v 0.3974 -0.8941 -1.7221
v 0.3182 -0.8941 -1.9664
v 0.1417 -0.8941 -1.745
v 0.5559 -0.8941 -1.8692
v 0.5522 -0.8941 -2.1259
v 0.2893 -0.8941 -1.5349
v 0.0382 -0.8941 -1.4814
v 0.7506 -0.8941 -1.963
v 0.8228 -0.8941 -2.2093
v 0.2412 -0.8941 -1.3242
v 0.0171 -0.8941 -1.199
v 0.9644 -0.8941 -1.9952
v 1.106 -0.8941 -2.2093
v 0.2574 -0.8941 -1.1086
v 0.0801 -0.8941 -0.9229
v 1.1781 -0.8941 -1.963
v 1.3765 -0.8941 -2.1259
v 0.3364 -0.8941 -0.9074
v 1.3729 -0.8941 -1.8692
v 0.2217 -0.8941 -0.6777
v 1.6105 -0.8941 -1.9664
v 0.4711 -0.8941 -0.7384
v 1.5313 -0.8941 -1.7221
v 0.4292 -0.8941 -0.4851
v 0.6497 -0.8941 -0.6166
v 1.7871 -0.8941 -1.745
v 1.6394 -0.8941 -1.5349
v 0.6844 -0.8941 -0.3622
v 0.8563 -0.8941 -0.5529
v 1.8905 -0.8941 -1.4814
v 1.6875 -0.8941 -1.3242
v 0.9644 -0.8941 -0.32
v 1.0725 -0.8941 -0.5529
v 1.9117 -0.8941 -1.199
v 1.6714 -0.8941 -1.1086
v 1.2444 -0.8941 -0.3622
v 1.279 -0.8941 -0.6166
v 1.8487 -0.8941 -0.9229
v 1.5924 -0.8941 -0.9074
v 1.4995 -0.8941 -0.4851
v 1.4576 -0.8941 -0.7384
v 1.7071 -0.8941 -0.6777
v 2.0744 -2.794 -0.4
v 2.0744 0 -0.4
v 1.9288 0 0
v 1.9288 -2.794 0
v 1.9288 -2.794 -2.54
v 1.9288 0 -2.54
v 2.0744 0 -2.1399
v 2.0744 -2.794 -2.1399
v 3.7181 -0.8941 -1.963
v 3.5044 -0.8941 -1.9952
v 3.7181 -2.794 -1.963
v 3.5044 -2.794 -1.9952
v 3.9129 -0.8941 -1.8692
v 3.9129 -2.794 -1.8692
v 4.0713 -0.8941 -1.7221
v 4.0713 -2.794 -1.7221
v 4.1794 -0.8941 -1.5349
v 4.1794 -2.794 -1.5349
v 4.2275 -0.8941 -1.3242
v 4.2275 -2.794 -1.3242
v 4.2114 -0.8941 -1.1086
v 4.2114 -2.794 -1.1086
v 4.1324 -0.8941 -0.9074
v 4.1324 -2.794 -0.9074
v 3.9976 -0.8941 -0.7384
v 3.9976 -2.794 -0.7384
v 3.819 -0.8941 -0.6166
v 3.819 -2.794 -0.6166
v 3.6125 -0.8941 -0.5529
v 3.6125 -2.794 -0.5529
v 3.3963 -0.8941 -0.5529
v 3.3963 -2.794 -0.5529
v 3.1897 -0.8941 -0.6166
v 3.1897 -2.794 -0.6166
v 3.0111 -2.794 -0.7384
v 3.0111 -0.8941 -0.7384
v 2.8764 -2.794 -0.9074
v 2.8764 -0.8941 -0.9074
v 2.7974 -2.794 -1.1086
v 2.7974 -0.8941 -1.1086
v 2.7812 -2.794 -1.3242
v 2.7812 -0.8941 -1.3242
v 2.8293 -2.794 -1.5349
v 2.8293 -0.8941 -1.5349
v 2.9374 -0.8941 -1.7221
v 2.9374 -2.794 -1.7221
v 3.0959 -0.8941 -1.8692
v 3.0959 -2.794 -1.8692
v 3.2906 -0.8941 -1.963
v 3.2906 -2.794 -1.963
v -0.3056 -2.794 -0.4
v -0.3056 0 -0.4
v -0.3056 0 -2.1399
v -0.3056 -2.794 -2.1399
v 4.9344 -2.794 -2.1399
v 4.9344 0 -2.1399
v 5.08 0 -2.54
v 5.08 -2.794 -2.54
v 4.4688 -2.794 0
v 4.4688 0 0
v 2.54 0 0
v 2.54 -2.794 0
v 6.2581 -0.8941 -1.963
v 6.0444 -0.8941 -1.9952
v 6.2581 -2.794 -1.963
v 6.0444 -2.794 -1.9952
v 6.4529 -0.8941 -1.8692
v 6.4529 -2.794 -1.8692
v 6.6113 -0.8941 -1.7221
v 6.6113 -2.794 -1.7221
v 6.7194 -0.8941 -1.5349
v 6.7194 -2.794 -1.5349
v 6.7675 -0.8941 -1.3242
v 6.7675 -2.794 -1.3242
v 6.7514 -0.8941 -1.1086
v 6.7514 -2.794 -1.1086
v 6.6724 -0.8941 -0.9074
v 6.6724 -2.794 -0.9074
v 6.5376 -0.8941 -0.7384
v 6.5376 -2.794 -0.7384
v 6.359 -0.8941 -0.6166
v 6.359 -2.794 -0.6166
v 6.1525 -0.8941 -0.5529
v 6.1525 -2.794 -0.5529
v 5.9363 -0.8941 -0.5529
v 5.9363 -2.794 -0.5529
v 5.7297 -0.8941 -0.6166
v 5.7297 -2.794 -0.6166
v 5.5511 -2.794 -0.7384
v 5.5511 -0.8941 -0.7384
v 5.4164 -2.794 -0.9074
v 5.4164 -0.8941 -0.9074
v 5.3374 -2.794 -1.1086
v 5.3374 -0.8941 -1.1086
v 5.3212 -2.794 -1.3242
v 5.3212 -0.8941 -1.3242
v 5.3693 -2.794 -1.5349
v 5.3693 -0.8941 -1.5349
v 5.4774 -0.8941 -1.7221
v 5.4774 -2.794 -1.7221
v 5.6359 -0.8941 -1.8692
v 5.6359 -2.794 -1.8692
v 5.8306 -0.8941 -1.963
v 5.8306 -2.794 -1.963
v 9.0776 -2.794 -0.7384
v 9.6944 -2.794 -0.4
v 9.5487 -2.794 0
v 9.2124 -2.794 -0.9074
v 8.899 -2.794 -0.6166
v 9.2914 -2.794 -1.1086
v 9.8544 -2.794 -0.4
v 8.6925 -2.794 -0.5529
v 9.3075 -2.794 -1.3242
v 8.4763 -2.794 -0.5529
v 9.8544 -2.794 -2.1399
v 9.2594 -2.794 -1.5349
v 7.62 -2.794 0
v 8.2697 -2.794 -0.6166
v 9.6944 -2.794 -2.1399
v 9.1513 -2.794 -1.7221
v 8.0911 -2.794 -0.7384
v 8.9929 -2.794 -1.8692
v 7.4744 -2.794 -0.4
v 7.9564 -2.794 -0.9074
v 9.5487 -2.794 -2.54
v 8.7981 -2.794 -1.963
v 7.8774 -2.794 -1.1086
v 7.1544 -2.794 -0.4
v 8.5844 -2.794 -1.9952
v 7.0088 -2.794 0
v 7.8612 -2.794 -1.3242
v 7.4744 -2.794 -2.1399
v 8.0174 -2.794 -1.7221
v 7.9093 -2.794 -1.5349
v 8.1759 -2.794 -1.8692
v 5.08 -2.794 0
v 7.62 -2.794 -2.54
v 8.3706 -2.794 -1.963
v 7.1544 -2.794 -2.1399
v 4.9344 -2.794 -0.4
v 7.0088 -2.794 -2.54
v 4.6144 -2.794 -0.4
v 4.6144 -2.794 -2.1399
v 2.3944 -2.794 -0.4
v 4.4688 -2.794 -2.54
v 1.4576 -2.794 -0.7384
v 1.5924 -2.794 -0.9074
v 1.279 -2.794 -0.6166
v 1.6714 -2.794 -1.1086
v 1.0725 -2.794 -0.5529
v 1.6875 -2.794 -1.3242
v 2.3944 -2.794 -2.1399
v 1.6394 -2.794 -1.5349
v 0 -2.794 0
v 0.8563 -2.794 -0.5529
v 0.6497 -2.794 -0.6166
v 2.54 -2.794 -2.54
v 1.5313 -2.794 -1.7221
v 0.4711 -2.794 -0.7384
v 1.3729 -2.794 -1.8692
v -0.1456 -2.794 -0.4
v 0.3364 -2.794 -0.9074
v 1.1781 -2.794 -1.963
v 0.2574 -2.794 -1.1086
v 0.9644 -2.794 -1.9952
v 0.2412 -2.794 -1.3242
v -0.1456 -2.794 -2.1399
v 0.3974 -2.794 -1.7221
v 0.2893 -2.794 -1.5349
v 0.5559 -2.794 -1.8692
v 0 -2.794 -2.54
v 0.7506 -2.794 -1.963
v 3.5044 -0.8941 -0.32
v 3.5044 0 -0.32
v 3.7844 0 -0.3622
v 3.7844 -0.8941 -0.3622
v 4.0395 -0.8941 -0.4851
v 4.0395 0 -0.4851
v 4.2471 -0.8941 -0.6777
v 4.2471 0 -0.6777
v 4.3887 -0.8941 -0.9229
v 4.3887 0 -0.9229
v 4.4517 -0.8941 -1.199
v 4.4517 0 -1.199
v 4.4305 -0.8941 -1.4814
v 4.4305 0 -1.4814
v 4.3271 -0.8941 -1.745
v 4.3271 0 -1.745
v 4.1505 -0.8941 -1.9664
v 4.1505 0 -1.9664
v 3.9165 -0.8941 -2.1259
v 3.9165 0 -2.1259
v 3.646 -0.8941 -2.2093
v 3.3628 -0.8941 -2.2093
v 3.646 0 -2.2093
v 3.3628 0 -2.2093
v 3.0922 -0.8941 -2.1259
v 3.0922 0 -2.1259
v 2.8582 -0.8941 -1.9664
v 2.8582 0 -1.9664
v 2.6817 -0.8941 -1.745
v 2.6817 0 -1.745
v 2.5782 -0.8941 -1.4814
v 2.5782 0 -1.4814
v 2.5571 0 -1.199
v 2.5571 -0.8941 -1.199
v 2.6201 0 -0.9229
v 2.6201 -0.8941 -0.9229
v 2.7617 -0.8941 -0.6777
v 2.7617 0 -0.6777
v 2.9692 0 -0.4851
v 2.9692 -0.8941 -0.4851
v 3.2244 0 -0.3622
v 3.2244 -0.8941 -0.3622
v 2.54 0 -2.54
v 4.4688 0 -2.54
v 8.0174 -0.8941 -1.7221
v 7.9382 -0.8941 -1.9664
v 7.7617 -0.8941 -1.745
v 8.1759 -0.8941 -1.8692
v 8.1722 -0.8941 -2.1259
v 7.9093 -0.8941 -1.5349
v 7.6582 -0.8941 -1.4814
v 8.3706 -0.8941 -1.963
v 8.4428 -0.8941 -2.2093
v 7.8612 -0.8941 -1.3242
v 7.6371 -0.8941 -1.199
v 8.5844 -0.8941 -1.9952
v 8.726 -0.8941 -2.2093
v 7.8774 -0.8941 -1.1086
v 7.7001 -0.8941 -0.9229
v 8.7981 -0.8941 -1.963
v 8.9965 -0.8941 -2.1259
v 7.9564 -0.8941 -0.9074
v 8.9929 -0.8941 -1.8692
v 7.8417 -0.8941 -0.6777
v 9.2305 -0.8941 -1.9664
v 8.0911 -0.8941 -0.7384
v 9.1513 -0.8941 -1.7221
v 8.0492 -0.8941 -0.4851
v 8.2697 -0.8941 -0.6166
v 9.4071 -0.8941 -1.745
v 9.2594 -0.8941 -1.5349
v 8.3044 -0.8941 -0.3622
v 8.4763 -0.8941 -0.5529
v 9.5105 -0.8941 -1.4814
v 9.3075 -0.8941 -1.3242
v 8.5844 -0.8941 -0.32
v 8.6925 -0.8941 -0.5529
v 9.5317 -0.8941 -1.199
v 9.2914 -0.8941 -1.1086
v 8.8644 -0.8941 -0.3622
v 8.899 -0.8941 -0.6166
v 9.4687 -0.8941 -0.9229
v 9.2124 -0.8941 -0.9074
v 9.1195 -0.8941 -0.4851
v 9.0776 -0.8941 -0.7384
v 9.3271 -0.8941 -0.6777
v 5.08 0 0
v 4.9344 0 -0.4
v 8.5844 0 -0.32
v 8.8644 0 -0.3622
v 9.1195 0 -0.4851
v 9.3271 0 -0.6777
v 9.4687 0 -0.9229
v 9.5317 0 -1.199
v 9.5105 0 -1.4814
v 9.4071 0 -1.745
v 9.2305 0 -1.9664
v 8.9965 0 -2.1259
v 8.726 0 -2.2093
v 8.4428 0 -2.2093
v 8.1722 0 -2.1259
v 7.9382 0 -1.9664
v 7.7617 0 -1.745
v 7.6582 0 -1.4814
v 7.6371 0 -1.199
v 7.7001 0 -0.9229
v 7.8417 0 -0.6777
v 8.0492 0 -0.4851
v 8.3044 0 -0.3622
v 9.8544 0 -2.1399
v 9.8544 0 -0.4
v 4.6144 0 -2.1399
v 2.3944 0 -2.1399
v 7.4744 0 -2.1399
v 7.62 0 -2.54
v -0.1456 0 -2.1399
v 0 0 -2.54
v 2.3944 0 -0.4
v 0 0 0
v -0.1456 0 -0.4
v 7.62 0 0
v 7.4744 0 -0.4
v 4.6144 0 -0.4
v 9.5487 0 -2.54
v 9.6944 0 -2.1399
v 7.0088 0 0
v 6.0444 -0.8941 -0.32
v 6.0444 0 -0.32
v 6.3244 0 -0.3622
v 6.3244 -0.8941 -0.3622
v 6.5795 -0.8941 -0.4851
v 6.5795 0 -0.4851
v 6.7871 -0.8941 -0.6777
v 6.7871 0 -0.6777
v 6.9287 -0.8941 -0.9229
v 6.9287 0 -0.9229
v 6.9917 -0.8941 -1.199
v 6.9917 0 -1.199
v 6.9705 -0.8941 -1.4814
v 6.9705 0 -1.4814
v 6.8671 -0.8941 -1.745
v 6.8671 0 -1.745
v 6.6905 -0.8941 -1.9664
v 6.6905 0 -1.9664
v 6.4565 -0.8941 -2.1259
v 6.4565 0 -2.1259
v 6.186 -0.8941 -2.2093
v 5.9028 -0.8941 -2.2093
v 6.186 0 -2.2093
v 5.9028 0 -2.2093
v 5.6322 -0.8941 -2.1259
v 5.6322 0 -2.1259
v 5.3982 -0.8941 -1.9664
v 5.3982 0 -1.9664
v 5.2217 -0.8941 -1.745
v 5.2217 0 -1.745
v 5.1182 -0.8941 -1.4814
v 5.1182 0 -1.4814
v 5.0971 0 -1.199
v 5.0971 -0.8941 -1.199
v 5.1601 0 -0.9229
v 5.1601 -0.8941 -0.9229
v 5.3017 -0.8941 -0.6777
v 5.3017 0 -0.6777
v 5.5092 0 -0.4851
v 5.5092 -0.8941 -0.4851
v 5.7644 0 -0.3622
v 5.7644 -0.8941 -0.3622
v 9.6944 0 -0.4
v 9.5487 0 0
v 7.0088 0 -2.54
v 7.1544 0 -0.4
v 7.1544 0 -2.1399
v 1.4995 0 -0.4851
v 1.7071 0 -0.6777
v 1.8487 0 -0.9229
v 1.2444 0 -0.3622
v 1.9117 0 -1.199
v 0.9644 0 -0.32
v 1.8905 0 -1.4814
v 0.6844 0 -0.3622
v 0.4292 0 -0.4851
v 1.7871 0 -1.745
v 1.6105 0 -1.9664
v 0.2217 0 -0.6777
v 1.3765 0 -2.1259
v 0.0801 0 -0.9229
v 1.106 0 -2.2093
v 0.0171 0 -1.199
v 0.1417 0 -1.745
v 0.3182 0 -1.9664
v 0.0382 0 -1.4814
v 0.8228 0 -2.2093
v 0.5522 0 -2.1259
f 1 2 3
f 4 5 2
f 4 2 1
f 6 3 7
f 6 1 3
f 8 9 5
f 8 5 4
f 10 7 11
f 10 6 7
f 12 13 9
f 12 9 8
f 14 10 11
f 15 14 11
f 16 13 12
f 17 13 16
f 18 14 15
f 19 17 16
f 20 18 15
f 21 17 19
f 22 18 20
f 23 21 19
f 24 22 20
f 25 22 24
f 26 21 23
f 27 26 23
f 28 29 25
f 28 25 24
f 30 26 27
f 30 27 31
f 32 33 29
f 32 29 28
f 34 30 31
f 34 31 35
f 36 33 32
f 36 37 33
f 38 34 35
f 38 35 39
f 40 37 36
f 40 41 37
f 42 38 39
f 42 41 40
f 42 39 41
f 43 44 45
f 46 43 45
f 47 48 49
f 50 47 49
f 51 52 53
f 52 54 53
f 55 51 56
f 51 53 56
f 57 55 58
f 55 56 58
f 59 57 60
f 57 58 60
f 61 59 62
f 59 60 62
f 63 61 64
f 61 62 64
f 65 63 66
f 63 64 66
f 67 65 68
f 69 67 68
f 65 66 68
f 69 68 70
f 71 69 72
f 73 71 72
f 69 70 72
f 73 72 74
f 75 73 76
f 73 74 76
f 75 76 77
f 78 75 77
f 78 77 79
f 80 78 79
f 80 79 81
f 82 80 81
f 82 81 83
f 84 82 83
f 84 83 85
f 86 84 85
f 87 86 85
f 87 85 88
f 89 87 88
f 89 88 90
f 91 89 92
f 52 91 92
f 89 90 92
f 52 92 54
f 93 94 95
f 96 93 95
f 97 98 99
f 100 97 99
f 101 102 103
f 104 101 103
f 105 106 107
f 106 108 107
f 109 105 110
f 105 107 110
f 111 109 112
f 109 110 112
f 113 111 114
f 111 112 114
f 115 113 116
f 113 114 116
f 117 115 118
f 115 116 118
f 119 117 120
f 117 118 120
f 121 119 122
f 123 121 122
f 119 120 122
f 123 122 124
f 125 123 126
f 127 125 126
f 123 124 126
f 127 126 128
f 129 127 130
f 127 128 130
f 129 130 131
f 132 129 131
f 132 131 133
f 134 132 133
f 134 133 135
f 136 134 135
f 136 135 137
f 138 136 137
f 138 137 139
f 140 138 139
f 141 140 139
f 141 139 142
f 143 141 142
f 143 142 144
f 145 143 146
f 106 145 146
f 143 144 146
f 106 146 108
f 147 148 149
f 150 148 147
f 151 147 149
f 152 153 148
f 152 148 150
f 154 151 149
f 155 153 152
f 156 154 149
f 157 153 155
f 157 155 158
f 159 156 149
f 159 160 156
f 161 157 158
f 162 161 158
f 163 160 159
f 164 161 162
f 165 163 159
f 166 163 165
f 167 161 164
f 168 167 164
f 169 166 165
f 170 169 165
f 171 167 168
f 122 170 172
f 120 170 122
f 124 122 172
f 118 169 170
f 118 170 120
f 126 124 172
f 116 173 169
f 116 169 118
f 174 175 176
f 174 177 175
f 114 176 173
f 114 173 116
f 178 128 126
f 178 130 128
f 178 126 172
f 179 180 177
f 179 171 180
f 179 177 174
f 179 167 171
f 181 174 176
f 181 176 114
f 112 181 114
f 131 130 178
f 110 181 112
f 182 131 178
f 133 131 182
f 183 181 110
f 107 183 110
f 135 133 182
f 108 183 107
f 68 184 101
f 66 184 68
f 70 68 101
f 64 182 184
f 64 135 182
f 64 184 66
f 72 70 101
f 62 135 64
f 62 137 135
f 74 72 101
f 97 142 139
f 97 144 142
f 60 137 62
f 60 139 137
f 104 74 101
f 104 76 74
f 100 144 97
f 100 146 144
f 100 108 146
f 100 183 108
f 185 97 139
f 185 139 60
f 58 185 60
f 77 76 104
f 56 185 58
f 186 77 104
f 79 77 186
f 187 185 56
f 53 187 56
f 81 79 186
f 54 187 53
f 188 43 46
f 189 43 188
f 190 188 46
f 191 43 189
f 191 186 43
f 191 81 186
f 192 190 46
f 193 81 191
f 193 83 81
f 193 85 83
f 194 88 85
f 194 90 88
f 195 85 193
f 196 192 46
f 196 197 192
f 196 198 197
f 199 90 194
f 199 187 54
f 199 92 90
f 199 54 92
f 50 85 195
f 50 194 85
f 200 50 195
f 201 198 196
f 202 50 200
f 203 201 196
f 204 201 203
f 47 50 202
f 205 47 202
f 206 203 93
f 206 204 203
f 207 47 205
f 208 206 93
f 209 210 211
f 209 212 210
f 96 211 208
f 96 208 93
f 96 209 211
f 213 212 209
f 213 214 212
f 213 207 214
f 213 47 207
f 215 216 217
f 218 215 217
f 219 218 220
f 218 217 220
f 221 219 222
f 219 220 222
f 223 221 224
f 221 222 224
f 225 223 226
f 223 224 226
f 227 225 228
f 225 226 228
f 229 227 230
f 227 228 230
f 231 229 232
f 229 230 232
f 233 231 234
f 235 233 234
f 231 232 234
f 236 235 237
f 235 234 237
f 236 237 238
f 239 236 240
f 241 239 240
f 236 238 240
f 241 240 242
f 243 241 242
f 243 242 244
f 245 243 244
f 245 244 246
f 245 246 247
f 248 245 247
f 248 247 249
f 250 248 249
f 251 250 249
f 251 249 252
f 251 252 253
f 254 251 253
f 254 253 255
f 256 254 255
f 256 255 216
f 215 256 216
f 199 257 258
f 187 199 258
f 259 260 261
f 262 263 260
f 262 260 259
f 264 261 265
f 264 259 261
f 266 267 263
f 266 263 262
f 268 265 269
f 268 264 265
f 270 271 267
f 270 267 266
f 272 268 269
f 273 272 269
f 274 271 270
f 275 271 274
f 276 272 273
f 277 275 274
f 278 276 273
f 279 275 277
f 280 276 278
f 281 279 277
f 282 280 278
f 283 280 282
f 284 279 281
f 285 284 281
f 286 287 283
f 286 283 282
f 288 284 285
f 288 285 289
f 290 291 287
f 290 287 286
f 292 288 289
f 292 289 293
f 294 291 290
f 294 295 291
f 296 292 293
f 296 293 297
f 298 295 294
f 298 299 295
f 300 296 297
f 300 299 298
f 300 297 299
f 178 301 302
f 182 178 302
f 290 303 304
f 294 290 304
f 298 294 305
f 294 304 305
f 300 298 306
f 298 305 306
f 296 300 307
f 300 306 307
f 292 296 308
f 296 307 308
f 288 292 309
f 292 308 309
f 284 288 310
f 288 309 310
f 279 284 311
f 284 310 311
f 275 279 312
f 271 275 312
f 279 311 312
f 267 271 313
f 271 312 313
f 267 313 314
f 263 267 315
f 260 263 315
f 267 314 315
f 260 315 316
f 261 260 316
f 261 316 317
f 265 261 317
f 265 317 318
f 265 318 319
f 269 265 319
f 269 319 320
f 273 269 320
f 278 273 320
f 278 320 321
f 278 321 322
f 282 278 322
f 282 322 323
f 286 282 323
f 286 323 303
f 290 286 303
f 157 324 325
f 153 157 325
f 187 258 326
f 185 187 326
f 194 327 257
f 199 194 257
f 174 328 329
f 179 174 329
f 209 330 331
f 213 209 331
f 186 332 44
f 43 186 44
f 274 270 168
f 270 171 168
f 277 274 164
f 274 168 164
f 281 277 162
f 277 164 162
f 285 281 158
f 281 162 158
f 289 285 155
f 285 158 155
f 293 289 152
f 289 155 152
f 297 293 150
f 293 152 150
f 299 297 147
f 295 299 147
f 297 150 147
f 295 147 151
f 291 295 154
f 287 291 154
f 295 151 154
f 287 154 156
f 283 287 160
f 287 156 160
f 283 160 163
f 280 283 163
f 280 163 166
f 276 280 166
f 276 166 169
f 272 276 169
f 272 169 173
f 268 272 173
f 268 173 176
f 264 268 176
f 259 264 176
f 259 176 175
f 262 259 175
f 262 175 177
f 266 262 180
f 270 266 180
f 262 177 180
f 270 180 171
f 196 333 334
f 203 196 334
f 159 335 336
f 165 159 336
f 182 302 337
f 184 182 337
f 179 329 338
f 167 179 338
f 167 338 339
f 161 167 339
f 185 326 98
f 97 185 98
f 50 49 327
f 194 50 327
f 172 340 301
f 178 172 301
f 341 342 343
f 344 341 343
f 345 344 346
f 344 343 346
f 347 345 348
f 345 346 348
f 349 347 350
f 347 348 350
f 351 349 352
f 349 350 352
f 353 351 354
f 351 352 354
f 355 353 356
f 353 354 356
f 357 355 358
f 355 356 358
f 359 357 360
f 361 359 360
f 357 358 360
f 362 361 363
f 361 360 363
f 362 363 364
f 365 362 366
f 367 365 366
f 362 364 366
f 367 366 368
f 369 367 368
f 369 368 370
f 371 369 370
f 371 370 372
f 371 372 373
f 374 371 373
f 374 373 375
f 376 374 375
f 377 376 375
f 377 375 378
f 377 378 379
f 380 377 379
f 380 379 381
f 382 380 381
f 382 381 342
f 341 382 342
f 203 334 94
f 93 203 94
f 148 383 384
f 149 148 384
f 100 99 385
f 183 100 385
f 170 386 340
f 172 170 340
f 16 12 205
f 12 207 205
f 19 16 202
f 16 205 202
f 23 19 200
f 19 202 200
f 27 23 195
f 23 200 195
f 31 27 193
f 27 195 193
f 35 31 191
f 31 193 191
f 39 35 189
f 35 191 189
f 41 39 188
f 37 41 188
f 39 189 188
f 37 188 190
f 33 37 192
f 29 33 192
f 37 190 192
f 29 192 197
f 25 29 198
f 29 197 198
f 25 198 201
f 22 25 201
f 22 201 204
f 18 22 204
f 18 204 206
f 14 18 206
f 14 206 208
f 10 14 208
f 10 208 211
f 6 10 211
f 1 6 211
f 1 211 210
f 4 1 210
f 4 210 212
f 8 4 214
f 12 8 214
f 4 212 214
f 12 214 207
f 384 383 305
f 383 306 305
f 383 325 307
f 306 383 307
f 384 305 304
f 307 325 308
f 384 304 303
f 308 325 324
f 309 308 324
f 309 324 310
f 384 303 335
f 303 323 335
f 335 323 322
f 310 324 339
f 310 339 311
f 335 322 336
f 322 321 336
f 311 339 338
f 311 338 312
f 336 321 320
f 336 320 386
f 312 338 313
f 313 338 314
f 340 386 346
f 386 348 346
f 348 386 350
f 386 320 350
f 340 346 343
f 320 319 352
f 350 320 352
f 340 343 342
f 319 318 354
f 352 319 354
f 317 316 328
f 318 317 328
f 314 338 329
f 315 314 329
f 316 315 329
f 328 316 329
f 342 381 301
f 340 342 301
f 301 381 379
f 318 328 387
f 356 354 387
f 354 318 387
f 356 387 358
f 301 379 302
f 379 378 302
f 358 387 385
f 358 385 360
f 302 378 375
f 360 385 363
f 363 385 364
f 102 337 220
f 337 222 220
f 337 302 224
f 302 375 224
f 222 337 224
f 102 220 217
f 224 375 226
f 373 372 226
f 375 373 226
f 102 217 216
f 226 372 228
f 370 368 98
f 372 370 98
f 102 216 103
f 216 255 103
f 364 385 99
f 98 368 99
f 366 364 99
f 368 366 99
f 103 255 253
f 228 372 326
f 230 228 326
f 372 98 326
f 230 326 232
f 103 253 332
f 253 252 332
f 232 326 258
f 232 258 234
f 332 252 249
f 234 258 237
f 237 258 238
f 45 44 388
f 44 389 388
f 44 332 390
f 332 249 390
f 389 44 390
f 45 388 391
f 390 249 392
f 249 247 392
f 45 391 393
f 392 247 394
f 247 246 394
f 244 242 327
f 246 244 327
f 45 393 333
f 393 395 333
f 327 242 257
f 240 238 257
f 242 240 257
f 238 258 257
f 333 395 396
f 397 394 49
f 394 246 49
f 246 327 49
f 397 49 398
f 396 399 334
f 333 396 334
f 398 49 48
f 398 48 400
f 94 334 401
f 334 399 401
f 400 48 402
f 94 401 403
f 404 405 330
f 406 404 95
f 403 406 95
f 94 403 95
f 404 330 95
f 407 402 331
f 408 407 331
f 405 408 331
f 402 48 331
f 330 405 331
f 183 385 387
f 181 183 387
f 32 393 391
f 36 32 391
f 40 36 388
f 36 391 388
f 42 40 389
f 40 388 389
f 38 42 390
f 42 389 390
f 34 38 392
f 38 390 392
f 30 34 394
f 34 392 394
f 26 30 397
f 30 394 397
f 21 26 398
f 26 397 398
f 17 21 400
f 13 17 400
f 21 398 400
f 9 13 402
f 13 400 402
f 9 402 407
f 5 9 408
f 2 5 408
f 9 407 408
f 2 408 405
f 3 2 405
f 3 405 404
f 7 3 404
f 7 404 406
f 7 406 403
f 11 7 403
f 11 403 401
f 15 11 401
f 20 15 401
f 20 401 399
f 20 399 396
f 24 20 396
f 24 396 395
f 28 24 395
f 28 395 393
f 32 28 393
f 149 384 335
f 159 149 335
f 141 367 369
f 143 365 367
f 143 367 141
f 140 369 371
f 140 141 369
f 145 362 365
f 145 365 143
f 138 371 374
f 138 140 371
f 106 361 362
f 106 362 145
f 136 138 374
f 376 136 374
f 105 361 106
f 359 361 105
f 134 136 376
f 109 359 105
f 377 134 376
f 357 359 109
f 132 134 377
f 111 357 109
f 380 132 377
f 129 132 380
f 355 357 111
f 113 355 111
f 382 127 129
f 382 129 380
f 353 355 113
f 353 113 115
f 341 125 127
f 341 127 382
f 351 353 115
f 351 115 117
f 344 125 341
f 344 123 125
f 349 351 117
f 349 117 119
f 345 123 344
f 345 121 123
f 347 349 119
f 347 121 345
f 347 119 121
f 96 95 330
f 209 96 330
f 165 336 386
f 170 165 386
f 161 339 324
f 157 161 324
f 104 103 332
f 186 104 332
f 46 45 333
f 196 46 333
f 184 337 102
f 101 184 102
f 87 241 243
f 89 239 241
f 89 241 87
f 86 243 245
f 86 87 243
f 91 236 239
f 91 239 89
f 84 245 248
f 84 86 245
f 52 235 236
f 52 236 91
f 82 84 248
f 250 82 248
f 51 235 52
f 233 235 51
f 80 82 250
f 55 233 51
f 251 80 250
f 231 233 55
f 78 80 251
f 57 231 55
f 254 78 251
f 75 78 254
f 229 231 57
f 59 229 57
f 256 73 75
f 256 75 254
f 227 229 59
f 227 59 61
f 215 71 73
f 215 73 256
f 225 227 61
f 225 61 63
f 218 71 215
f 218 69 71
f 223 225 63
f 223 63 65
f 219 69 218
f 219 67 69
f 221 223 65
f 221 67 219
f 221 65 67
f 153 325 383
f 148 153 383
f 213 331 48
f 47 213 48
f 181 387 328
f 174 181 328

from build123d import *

# Parameters (mm, degrees)
EXTRUDE1_DEPTH    = 2.794
HOLE1_D           = 1.45034
HOLE1_CBORE_D     = 1.89992
HOLE1_CBORE_DEPTH = 0.89408
EXTRUDE2_DEPTH    = 2.794
LPATTERN1_COUNT   = 4
LPATTERN1_PITCH   = 2.54
LPATTERN2_COUNT   = 63
LPATTERN2_PITCH   = 2.54


with BuildPart() as part:
    # Sketch1 → Extrude1 (new body)
    with BuildSketch(Plane(origin=(0, 0, 0), x_dir=(1, 0, 0), z_dir=(0, 1, 0))):
        Polygon((9.854373708, 0.40005), (9.694353708, 0.40005), (9.548747416, 0), (0, 0), (-0.145606292, 0.40005), (-0.305626292, 0.40005), (-0.305626292, 2.13995), (-0.145606292, 2.13995), (0, 2.54), (9.548747416, 2.54), (9.694353708, 2.13995), (9.854373708, 2.13995), align=None)
    extrude(amount=-EXTRUDE1_DEPTH)

    # Hole1 (through all)
    with Locations(Plane(origin=(0.964373708, 0, -1.27), x_dir=(0, 0, 1), z_dir=(0, 1, 0))):
        with Locations((0, 0)):
            hole1 = CounterBoreHole(HOLE1_D / 2, HOLE1_CBORE_D / 2, HOLE1_CBORE_DEPTH)

    # Sketch4 → Extrude2 (cut)
    with BuildSketch(Plane(origin=(0, 0, 0), x_dir=(1, 0, 0), z_dir=(0, 1, 0))):
        Polygon((1.928772816, 0), (2.5399746, 0), (2.394368308, 0.40005), (2.074379108, 0.40005), align=None)
        Polygon((2.074379108, 2.13995), (2.394368308, 2.13995), (2.5399746, 2.54), (1.928772816, 2.54), align=None)
    extrude2 = extrude(amount=-EXTRUDE2_DEPTH, mode=Mode.SUBTRACT)

    # LPattern1: Hole1 ×4
    with Locations(*[(i * LPATTERN1_PITCH, 0, 0) for i in range(1, LPATTERN1_COUNT)]):
        add(hole1, mode=Mode.SUBTRACT)

    # LPattern2: Extrude2 ×63
    with Locations(*[(i * LPATTERN2_PITCH, 0, 0) for i in range(1, LPATTERN2_COUNT)]):
        add(extrude2, mode=Mode.SUBTRACT)


solid = part.part
